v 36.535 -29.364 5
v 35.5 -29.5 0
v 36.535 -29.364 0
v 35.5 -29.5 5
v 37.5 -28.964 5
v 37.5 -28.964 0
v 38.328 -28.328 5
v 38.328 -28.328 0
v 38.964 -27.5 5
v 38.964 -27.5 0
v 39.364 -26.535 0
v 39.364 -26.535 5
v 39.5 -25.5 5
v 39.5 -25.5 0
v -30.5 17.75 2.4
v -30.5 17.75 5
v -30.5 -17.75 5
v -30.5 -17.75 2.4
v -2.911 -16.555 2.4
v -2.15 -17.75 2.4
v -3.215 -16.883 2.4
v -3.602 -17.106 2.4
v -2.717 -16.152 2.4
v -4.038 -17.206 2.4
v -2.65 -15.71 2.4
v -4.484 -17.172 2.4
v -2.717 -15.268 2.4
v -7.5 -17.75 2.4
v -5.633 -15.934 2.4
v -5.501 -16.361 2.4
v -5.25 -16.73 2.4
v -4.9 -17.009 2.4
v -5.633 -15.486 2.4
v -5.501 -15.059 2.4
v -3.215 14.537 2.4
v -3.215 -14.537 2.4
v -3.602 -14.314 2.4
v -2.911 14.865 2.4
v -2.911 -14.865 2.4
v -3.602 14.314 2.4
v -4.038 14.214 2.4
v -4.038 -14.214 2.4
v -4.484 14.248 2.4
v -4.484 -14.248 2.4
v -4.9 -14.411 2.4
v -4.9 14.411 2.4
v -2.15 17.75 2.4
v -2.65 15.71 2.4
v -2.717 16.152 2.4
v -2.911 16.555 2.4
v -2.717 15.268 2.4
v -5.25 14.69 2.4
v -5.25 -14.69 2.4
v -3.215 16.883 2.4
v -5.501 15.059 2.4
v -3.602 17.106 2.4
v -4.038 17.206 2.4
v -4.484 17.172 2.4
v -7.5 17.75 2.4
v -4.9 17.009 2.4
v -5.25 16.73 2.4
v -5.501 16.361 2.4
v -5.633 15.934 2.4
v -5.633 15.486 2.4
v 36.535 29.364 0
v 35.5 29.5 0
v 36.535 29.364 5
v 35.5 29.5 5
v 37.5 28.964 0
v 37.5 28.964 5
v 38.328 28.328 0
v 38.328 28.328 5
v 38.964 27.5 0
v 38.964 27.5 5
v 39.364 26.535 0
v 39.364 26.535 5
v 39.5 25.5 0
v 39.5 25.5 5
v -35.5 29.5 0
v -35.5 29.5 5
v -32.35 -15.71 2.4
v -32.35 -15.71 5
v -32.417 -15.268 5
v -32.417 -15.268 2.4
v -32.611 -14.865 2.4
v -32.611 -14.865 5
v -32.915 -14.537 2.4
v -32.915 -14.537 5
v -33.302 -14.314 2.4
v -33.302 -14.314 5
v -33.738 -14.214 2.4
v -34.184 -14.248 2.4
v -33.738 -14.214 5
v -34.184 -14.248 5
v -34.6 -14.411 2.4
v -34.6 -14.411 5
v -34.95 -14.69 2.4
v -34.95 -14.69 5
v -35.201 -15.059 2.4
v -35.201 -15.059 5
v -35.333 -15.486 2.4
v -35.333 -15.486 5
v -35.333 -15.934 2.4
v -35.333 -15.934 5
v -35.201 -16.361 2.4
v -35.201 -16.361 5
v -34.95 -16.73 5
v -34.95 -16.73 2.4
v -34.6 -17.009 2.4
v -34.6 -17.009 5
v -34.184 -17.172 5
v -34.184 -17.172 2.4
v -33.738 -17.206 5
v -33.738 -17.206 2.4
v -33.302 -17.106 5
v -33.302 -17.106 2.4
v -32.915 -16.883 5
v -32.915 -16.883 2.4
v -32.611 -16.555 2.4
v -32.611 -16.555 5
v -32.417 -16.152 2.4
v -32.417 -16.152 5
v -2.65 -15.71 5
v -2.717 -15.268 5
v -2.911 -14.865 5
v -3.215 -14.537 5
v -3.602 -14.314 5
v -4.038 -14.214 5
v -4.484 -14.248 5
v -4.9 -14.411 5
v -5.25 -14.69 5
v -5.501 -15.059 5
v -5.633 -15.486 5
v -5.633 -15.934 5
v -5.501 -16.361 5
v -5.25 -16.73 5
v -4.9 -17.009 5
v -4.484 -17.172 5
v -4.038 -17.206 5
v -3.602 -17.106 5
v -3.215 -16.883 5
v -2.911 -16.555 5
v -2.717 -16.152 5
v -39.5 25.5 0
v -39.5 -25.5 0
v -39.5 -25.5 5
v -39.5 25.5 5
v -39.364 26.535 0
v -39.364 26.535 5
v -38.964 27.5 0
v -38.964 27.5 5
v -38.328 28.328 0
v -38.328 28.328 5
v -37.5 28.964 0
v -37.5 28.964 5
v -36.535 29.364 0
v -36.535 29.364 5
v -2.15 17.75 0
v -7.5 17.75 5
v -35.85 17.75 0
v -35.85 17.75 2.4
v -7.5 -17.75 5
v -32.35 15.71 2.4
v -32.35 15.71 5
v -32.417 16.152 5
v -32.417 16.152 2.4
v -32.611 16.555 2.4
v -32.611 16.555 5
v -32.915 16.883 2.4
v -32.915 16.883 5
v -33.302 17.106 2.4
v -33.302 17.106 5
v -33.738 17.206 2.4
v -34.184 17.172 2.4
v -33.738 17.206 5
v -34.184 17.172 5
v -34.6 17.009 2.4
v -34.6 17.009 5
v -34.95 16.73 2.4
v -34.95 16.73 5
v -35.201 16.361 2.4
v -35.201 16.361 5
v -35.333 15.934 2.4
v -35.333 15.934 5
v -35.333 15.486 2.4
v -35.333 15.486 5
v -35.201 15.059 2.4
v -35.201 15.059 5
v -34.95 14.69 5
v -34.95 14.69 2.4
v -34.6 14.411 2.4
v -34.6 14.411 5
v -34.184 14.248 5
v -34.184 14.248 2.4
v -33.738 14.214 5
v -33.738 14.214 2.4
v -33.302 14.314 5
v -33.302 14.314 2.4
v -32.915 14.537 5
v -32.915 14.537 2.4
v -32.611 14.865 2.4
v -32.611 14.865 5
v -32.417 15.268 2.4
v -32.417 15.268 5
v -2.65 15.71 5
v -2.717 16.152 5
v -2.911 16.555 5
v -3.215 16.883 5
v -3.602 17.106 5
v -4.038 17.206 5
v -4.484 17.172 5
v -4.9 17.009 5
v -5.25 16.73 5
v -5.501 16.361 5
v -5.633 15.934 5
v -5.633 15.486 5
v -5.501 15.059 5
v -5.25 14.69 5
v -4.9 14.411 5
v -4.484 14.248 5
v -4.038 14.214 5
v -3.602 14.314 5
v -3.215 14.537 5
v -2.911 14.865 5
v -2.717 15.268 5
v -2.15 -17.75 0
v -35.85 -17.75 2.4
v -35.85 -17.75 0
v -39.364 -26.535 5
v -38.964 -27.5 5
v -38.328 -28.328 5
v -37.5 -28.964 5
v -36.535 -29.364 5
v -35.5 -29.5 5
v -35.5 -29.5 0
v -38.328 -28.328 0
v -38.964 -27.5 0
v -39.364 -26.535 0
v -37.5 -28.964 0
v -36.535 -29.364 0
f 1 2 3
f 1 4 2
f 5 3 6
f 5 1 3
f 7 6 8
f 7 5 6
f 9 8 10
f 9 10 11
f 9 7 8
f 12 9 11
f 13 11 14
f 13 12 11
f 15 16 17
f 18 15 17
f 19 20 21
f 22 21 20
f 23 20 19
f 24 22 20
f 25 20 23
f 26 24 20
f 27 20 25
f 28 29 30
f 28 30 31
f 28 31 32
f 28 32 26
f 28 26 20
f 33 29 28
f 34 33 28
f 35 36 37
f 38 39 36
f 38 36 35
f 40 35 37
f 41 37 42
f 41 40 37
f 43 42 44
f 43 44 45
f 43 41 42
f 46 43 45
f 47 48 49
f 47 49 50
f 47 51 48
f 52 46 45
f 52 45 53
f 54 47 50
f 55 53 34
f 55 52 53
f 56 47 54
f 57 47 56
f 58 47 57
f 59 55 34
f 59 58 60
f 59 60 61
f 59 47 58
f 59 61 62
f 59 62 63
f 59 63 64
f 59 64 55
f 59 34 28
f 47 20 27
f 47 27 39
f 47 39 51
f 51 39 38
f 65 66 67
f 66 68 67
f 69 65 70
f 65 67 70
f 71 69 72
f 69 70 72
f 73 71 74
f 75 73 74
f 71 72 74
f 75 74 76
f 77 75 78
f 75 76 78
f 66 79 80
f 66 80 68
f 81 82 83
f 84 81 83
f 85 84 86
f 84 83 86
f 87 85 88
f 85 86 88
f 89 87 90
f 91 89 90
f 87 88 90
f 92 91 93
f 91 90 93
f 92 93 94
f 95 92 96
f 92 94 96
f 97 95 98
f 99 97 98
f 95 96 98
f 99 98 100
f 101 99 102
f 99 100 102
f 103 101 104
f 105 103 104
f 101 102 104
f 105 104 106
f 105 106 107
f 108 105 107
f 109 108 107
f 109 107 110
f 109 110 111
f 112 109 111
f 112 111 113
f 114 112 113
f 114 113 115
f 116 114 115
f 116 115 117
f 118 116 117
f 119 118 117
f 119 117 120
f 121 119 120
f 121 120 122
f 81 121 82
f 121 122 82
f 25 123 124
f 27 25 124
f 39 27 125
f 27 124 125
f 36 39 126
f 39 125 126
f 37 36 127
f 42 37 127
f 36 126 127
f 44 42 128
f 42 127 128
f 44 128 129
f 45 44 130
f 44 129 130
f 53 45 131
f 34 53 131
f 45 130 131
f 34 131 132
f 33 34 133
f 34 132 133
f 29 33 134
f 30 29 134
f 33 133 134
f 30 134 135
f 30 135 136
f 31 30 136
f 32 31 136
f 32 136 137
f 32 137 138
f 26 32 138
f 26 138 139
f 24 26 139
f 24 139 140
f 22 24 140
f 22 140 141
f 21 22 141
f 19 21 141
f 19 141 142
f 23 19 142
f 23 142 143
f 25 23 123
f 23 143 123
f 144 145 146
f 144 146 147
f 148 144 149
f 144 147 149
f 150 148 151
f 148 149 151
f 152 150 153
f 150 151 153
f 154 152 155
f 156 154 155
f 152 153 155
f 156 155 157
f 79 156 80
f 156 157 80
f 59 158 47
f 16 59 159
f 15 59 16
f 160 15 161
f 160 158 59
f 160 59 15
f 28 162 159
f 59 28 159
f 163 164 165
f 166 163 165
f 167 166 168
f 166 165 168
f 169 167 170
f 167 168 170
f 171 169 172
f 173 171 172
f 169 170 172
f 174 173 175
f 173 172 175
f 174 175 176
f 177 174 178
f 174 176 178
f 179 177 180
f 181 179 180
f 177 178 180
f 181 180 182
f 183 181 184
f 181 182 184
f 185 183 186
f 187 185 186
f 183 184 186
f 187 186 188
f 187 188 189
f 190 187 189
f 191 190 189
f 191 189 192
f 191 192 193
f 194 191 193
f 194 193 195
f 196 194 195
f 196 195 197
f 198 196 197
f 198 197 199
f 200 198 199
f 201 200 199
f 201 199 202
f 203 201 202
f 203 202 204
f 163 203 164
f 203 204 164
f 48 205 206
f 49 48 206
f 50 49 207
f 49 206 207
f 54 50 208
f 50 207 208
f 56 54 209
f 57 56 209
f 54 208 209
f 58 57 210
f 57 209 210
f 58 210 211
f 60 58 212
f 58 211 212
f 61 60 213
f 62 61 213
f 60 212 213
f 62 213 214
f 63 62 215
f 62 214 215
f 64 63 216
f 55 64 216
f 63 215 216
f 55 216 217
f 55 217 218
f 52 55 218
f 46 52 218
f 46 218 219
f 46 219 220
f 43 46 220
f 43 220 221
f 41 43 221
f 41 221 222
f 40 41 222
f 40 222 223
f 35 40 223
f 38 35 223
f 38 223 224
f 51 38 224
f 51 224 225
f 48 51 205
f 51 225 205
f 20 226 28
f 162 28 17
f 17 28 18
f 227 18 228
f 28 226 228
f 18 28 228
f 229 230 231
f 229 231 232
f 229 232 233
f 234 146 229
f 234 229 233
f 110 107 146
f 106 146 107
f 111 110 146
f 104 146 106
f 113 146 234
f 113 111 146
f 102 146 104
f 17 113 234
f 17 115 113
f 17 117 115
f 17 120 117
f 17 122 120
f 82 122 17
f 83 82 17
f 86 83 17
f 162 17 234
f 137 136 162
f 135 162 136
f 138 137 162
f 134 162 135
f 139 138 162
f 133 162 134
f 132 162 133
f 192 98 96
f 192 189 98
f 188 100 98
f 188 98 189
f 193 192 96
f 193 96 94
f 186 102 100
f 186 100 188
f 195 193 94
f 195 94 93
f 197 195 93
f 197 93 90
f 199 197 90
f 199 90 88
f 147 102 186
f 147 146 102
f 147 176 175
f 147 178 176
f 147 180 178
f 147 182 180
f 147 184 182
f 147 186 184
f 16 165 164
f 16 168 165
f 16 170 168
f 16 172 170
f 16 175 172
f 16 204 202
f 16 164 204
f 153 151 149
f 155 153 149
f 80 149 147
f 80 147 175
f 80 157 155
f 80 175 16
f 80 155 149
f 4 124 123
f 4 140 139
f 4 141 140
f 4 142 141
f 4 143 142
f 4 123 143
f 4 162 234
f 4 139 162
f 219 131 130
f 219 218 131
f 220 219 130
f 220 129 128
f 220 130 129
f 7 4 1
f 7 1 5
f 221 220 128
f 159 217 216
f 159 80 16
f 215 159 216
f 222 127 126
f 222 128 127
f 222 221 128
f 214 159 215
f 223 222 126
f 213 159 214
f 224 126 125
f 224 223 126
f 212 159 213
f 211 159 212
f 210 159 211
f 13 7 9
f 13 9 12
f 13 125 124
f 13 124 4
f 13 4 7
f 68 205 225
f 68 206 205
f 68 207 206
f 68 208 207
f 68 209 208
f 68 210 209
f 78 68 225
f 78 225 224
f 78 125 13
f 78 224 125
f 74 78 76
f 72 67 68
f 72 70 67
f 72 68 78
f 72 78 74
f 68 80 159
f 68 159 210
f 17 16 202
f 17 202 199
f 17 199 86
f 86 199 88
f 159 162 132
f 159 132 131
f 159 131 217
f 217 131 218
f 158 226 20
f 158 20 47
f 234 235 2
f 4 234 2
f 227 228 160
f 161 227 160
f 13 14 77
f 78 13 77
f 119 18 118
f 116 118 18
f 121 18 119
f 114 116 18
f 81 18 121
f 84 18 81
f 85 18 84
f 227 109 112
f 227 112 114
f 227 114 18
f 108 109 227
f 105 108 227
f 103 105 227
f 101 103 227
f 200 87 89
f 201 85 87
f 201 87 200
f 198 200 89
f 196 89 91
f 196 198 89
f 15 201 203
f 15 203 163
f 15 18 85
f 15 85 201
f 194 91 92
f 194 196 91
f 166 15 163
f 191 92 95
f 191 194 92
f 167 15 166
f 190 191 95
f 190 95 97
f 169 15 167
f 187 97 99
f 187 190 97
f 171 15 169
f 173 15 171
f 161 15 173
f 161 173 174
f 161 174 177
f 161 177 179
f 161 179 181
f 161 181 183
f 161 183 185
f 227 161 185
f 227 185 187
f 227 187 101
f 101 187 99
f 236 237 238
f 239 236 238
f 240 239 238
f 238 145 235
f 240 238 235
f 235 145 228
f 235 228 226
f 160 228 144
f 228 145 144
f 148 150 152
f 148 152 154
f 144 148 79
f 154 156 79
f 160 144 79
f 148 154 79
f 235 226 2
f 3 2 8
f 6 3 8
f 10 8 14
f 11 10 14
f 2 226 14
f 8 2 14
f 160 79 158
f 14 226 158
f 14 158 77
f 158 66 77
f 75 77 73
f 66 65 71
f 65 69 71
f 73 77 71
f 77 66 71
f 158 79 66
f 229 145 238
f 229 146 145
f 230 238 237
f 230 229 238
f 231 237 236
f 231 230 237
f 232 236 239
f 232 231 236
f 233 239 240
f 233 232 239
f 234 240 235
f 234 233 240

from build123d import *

# Parameters (mm, degrees)
SKETCH1_W           = 79
SKETCH1_H           = 59
BOSS_EXTRUDE1_DEPTH = 5
SKETCH2_R           = 1.5
SKETCH2_W           = 23
SKETCH2_H           = 17.75
CUT_EXTRUDE1_DEPTH  = 2.6
SKETCH3_W           = 33.7
SKETCH3_H           = 35.5
CUT_EXTRUDE2_DEPTH  = 2.4
FILLET1_R           = 4


with BuildPart() as part:
    # Sketch1 → Boss-Extrude1 (new body)
    with BuildSketch(Plane.XY):
        Rectangle(SKETCH1_W, SKETCH1_H)
    extrude(amount=BOSS_EXTRUDE1_DEPTH)

    # Sketch2 → Cut-Extrude1 (cut)
    with BuildSketch(Plane.XY.offset(5)):
        with Locations((-4.15, 15.71)):
            Circle(SKETCH2_R)
        with Locations((-4.15, -15.71)):
            Circle(SKETCH2_R)
        with Locations((-33.85, -15.71)):
            Circle(SKETCH2_R)
        with Locations((-33.85, 15.71)):
            Circle(SKETCH2_R)
        with Locations((-19, -8.875)):
            Rectangle(SKETCH2_W, SKETCH2_H)
        with Locations((-19, 8.875)):
            Rectangle(SKETCH2_W, SKETCH2_H)
    extrude(amount=-CUT_EXTRUDE1_DEPTH, mode=Mode.SUBTRACT)

    # Sketch3 → Cut-Extrude2 (cut)
    with BuildSketch(Plane(origin=(0, 0, 0), x_dir=(-1, 0, 0), z_dir=(0, 0, -1))):
        with Locations((19, 0)):
            Rectangle(SKETCH3_W, SKETCH3_H)
    extrude(amount=-CUT_EXTRUDE2_DEPTH, mode=Mode.SUBTRACT)

    # Fillet1
    fillet1_edges = [part.edges().sort_by_distance(p)[0] for p in [
        (39.5, -29.5, 2.5),
        (-39.5, -29.5, 2.5),
        (-39.5, 29.5, 2.5),
        (39.5, 29.5, 2.5),
    ]]
    fillet(fillet1_edges, radius=FILLET1_R)


solid = part.part
